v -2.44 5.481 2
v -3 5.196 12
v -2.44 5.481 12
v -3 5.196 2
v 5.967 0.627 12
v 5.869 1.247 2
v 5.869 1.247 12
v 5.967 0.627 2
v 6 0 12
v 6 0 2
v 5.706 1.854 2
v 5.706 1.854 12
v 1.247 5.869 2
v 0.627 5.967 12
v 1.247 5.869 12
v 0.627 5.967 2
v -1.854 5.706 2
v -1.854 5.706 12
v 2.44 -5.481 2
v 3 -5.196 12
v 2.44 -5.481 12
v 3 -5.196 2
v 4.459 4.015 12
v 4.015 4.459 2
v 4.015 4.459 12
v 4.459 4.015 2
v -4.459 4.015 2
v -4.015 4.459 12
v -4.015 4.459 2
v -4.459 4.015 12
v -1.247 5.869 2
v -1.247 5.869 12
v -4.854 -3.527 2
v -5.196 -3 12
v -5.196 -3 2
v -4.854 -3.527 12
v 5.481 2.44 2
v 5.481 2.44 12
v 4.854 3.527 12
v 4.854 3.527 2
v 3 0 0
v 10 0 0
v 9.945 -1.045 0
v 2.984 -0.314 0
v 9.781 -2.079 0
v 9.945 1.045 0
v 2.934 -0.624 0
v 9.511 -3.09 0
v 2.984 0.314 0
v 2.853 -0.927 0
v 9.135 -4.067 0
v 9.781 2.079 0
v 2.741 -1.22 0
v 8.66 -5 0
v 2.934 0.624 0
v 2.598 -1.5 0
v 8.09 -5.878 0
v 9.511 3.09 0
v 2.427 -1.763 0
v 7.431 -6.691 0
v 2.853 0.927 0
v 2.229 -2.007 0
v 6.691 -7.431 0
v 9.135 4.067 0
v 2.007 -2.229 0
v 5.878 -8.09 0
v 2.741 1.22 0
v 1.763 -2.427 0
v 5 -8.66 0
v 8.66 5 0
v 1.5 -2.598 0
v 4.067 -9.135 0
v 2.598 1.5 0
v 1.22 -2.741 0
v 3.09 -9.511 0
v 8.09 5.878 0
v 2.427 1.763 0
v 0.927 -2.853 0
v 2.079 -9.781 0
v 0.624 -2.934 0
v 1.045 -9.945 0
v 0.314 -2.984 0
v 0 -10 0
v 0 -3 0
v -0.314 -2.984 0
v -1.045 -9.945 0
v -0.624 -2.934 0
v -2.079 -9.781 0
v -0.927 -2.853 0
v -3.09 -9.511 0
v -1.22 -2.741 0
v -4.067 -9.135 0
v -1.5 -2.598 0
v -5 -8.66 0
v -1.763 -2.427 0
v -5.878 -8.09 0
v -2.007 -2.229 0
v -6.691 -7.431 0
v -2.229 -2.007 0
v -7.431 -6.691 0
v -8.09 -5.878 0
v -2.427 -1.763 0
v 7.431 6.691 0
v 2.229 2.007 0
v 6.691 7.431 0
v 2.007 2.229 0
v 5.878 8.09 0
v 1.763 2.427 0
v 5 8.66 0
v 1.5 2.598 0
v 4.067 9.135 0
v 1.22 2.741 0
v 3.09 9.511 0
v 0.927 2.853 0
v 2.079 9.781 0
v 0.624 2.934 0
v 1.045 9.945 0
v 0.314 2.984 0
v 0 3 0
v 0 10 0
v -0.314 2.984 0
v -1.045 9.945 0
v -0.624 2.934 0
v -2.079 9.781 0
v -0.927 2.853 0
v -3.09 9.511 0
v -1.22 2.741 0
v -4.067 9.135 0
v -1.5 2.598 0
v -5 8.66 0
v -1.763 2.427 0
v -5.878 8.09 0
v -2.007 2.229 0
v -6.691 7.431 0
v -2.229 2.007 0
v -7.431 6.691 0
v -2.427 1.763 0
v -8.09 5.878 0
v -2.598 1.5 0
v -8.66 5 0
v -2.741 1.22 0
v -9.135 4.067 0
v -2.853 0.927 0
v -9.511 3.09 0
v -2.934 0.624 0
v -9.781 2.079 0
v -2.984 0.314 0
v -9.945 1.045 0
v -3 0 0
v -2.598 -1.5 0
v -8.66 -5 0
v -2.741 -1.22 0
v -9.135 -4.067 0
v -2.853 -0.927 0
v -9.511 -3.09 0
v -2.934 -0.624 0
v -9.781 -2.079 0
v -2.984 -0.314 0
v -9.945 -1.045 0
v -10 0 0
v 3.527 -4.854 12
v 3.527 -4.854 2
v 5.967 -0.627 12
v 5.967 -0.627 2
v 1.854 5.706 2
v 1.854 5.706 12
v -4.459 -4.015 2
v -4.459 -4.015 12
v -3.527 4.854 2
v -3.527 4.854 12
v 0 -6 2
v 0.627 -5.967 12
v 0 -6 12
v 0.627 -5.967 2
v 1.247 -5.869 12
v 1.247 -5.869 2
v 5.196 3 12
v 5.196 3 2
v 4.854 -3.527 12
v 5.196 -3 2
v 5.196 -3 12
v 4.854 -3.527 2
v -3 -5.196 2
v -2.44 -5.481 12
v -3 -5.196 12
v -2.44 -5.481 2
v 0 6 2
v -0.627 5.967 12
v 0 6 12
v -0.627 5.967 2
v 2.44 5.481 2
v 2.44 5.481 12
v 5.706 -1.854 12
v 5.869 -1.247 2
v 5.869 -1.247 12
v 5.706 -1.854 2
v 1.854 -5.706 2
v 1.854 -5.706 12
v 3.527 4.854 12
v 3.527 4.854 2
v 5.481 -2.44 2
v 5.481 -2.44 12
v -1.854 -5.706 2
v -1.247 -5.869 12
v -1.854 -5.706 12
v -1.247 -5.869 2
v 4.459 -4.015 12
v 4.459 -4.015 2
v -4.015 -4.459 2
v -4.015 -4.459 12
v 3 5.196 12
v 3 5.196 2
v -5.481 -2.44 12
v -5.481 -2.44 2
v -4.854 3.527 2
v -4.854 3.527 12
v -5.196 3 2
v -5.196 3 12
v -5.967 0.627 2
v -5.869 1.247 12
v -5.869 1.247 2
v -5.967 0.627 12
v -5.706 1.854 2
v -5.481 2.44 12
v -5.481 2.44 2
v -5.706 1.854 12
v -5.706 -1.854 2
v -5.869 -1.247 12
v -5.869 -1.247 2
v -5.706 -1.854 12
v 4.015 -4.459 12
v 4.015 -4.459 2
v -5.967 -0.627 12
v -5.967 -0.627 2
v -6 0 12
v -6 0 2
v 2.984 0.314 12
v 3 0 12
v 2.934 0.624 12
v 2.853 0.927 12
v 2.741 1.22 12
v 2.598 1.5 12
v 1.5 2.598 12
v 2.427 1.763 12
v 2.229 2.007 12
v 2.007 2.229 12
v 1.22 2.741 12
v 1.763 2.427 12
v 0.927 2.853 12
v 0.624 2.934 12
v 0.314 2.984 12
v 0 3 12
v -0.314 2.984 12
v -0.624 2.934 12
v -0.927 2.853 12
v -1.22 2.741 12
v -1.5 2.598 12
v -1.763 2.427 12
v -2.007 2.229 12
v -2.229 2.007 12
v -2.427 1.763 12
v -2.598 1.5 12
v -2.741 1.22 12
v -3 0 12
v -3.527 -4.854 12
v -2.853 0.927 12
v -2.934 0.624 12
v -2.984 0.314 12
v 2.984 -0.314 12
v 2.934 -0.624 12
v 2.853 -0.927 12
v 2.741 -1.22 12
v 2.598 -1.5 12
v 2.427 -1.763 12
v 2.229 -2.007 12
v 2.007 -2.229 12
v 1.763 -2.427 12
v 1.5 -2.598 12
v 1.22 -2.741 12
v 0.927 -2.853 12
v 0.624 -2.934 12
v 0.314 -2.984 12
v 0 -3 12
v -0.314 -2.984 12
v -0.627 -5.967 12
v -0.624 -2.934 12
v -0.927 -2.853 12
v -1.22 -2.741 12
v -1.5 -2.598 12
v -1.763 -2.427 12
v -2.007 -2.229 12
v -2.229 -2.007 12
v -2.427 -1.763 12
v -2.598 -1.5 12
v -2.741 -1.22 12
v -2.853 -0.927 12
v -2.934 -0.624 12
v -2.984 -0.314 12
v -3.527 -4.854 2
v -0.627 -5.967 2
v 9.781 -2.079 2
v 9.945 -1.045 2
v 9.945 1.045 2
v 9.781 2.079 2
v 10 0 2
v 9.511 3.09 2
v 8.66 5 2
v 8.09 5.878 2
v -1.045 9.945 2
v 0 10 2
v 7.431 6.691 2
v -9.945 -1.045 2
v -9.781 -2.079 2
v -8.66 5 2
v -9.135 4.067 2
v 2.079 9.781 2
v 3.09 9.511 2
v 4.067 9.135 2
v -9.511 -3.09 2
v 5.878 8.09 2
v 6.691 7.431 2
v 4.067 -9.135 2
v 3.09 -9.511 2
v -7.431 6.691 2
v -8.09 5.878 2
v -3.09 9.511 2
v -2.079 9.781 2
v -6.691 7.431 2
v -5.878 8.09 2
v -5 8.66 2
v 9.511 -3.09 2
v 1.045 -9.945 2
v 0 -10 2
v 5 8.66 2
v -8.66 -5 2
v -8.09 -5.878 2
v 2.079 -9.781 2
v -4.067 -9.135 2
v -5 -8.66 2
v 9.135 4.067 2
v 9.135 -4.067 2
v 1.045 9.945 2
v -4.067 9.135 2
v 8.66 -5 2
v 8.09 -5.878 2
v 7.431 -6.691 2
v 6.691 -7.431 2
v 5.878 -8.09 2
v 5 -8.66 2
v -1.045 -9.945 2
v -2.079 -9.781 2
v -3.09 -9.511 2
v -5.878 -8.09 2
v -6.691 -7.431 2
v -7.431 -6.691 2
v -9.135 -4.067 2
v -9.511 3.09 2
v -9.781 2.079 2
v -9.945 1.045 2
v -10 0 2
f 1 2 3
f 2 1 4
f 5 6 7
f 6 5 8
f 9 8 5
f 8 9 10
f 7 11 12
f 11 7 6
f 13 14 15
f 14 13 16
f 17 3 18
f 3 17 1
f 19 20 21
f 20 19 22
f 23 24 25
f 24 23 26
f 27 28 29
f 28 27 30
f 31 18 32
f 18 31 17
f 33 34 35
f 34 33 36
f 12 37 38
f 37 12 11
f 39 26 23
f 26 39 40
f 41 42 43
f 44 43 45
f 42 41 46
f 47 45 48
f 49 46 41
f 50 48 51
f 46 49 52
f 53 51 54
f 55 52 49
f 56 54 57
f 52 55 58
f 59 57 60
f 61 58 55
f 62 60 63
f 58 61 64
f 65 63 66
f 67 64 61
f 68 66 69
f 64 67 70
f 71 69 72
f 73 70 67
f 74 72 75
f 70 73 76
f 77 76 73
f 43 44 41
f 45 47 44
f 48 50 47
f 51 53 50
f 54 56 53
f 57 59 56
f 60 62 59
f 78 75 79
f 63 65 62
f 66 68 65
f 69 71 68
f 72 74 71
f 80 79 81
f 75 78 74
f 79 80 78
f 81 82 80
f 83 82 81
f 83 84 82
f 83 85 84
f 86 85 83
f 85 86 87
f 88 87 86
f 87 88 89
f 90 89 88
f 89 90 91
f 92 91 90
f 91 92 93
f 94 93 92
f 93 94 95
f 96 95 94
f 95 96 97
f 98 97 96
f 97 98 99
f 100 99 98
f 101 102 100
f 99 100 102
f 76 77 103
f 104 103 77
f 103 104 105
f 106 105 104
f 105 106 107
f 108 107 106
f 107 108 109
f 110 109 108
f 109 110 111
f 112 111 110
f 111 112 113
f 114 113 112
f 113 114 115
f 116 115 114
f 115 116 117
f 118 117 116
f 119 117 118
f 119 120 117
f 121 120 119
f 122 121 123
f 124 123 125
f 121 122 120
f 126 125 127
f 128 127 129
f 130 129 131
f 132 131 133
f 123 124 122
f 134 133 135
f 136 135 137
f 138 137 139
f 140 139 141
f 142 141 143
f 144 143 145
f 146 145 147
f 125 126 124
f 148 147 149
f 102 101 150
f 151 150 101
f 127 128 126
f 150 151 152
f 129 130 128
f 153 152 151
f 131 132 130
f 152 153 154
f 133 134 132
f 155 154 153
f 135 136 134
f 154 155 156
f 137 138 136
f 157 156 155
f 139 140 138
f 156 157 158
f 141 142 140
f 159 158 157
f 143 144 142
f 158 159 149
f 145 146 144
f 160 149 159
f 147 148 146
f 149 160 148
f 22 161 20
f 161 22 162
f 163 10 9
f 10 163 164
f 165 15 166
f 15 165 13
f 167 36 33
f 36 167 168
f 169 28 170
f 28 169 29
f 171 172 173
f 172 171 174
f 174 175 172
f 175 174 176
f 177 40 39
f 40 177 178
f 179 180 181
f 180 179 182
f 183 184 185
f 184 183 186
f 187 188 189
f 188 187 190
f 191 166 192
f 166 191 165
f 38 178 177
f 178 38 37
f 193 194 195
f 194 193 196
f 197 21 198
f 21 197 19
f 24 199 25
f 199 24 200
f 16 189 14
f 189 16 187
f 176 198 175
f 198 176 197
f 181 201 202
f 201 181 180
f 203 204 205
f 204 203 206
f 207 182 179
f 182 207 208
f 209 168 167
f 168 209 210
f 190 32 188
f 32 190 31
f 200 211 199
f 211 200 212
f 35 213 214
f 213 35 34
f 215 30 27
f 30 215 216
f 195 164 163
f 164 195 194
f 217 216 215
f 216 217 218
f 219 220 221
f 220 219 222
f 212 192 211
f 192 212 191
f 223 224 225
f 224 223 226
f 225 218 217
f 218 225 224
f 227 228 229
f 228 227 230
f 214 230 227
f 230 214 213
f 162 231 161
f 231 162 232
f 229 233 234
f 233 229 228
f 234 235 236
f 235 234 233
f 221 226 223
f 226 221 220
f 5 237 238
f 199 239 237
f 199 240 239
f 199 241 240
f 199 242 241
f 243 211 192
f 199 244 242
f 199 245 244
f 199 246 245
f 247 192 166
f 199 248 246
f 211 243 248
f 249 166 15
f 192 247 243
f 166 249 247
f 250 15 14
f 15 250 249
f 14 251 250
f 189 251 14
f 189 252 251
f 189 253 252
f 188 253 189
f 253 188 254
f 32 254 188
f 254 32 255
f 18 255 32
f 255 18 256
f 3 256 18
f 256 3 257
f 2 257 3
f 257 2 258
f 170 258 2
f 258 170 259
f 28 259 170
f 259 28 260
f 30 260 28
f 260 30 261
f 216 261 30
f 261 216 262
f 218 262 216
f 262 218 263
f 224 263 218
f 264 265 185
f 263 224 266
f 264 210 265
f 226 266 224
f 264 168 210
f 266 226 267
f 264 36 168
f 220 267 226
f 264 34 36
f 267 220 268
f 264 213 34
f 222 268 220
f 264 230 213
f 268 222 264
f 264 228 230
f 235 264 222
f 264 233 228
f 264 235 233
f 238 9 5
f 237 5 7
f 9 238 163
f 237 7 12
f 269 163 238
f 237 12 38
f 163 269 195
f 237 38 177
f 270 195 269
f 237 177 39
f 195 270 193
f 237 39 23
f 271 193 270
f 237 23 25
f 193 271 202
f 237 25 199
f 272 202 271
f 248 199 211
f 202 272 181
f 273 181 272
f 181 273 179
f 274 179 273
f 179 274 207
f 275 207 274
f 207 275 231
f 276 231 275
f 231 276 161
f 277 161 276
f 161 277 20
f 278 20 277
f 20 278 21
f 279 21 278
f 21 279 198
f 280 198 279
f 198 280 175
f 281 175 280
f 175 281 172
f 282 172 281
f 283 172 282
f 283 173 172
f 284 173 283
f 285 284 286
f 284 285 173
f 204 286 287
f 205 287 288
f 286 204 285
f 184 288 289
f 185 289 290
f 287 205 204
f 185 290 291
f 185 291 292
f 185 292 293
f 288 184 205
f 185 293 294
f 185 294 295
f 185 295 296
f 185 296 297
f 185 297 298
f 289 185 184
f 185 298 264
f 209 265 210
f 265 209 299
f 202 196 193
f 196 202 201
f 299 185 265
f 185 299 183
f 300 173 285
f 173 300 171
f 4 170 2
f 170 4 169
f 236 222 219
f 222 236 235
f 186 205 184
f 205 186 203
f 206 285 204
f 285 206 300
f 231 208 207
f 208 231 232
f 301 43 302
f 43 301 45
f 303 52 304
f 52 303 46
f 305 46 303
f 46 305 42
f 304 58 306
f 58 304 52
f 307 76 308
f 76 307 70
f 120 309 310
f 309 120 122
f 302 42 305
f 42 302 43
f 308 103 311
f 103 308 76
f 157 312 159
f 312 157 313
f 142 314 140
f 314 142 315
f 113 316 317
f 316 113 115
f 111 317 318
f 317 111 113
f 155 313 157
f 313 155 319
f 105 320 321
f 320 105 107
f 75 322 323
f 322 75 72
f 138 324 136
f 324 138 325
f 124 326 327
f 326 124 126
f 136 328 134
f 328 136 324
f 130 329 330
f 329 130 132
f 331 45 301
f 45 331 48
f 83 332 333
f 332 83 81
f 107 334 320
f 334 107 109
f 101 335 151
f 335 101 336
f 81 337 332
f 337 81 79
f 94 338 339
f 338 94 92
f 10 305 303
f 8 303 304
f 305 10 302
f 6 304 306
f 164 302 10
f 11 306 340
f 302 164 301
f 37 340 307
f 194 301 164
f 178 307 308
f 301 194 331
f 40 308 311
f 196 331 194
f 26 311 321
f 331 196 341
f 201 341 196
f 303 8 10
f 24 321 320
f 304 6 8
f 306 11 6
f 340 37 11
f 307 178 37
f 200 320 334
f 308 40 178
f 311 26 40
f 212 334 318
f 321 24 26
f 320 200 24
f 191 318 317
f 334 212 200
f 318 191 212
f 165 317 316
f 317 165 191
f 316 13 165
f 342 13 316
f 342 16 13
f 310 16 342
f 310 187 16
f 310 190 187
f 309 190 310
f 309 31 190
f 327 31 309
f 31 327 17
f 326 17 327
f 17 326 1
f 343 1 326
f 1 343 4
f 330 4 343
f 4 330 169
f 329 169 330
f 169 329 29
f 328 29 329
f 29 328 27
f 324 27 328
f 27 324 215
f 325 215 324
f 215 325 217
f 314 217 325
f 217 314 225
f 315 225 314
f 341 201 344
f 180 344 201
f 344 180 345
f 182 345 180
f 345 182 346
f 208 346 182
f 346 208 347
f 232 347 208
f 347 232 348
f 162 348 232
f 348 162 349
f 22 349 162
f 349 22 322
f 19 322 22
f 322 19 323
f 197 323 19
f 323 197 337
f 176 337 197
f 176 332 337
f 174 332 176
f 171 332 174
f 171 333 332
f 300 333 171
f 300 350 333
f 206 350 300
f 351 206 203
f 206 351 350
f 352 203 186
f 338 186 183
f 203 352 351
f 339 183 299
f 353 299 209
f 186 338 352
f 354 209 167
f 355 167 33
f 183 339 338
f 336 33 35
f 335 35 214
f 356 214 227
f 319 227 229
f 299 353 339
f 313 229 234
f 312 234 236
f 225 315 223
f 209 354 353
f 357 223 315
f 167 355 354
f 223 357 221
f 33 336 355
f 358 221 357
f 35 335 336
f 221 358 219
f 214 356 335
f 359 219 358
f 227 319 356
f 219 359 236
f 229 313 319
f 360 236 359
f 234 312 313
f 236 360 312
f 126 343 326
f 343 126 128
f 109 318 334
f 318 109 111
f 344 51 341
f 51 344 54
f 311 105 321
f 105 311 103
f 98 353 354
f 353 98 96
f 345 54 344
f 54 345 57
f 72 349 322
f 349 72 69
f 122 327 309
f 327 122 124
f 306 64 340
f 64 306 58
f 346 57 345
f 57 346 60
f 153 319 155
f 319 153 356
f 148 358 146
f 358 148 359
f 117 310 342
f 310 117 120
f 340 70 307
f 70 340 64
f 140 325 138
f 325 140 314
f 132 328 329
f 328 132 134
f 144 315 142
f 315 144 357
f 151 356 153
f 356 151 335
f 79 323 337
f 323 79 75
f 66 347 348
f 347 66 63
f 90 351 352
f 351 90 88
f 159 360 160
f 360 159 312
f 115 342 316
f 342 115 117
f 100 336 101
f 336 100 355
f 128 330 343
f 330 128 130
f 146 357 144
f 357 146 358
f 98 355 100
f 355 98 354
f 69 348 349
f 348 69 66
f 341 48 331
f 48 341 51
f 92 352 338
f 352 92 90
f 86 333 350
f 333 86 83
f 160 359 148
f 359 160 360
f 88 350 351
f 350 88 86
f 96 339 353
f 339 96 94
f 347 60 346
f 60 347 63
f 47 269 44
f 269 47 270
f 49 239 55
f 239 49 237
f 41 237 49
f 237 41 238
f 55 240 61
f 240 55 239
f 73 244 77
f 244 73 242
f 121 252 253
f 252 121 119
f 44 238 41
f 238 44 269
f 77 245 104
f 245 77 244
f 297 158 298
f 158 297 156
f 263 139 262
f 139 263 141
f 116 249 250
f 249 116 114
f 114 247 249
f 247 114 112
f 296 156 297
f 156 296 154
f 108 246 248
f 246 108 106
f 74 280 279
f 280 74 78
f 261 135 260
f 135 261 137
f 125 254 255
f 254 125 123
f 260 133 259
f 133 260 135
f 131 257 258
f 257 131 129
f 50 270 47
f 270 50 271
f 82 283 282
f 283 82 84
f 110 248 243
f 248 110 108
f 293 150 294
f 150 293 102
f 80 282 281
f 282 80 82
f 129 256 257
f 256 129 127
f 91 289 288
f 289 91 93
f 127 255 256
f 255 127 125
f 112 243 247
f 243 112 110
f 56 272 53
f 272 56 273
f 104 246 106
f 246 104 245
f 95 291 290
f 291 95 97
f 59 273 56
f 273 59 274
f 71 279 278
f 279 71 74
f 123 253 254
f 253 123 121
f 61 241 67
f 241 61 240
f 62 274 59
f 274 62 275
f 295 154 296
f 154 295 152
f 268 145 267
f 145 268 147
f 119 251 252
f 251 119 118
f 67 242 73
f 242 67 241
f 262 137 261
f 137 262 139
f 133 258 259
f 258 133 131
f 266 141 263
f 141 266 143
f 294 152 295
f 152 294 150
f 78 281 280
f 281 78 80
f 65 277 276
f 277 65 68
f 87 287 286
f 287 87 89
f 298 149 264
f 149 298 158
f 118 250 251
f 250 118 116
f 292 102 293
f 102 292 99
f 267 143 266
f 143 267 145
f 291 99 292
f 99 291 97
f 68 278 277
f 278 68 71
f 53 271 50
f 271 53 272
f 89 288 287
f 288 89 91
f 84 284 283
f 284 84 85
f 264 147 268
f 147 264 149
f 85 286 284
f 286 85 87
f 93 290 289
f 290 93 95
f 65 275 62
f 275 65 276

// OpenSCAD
// Flanged spacer.
$fn = 60;
eps = 0.02;
inner_d = 6;
outer_d = 12;
length = 12;
flange_d = 20;
difference() { union() { cylinder(d=outer_d,h=length); cylinder(d=flange_d,h=2); } translate([0,0,-eps]) cylinder(d=inner_d,h=length+2*eps); }
